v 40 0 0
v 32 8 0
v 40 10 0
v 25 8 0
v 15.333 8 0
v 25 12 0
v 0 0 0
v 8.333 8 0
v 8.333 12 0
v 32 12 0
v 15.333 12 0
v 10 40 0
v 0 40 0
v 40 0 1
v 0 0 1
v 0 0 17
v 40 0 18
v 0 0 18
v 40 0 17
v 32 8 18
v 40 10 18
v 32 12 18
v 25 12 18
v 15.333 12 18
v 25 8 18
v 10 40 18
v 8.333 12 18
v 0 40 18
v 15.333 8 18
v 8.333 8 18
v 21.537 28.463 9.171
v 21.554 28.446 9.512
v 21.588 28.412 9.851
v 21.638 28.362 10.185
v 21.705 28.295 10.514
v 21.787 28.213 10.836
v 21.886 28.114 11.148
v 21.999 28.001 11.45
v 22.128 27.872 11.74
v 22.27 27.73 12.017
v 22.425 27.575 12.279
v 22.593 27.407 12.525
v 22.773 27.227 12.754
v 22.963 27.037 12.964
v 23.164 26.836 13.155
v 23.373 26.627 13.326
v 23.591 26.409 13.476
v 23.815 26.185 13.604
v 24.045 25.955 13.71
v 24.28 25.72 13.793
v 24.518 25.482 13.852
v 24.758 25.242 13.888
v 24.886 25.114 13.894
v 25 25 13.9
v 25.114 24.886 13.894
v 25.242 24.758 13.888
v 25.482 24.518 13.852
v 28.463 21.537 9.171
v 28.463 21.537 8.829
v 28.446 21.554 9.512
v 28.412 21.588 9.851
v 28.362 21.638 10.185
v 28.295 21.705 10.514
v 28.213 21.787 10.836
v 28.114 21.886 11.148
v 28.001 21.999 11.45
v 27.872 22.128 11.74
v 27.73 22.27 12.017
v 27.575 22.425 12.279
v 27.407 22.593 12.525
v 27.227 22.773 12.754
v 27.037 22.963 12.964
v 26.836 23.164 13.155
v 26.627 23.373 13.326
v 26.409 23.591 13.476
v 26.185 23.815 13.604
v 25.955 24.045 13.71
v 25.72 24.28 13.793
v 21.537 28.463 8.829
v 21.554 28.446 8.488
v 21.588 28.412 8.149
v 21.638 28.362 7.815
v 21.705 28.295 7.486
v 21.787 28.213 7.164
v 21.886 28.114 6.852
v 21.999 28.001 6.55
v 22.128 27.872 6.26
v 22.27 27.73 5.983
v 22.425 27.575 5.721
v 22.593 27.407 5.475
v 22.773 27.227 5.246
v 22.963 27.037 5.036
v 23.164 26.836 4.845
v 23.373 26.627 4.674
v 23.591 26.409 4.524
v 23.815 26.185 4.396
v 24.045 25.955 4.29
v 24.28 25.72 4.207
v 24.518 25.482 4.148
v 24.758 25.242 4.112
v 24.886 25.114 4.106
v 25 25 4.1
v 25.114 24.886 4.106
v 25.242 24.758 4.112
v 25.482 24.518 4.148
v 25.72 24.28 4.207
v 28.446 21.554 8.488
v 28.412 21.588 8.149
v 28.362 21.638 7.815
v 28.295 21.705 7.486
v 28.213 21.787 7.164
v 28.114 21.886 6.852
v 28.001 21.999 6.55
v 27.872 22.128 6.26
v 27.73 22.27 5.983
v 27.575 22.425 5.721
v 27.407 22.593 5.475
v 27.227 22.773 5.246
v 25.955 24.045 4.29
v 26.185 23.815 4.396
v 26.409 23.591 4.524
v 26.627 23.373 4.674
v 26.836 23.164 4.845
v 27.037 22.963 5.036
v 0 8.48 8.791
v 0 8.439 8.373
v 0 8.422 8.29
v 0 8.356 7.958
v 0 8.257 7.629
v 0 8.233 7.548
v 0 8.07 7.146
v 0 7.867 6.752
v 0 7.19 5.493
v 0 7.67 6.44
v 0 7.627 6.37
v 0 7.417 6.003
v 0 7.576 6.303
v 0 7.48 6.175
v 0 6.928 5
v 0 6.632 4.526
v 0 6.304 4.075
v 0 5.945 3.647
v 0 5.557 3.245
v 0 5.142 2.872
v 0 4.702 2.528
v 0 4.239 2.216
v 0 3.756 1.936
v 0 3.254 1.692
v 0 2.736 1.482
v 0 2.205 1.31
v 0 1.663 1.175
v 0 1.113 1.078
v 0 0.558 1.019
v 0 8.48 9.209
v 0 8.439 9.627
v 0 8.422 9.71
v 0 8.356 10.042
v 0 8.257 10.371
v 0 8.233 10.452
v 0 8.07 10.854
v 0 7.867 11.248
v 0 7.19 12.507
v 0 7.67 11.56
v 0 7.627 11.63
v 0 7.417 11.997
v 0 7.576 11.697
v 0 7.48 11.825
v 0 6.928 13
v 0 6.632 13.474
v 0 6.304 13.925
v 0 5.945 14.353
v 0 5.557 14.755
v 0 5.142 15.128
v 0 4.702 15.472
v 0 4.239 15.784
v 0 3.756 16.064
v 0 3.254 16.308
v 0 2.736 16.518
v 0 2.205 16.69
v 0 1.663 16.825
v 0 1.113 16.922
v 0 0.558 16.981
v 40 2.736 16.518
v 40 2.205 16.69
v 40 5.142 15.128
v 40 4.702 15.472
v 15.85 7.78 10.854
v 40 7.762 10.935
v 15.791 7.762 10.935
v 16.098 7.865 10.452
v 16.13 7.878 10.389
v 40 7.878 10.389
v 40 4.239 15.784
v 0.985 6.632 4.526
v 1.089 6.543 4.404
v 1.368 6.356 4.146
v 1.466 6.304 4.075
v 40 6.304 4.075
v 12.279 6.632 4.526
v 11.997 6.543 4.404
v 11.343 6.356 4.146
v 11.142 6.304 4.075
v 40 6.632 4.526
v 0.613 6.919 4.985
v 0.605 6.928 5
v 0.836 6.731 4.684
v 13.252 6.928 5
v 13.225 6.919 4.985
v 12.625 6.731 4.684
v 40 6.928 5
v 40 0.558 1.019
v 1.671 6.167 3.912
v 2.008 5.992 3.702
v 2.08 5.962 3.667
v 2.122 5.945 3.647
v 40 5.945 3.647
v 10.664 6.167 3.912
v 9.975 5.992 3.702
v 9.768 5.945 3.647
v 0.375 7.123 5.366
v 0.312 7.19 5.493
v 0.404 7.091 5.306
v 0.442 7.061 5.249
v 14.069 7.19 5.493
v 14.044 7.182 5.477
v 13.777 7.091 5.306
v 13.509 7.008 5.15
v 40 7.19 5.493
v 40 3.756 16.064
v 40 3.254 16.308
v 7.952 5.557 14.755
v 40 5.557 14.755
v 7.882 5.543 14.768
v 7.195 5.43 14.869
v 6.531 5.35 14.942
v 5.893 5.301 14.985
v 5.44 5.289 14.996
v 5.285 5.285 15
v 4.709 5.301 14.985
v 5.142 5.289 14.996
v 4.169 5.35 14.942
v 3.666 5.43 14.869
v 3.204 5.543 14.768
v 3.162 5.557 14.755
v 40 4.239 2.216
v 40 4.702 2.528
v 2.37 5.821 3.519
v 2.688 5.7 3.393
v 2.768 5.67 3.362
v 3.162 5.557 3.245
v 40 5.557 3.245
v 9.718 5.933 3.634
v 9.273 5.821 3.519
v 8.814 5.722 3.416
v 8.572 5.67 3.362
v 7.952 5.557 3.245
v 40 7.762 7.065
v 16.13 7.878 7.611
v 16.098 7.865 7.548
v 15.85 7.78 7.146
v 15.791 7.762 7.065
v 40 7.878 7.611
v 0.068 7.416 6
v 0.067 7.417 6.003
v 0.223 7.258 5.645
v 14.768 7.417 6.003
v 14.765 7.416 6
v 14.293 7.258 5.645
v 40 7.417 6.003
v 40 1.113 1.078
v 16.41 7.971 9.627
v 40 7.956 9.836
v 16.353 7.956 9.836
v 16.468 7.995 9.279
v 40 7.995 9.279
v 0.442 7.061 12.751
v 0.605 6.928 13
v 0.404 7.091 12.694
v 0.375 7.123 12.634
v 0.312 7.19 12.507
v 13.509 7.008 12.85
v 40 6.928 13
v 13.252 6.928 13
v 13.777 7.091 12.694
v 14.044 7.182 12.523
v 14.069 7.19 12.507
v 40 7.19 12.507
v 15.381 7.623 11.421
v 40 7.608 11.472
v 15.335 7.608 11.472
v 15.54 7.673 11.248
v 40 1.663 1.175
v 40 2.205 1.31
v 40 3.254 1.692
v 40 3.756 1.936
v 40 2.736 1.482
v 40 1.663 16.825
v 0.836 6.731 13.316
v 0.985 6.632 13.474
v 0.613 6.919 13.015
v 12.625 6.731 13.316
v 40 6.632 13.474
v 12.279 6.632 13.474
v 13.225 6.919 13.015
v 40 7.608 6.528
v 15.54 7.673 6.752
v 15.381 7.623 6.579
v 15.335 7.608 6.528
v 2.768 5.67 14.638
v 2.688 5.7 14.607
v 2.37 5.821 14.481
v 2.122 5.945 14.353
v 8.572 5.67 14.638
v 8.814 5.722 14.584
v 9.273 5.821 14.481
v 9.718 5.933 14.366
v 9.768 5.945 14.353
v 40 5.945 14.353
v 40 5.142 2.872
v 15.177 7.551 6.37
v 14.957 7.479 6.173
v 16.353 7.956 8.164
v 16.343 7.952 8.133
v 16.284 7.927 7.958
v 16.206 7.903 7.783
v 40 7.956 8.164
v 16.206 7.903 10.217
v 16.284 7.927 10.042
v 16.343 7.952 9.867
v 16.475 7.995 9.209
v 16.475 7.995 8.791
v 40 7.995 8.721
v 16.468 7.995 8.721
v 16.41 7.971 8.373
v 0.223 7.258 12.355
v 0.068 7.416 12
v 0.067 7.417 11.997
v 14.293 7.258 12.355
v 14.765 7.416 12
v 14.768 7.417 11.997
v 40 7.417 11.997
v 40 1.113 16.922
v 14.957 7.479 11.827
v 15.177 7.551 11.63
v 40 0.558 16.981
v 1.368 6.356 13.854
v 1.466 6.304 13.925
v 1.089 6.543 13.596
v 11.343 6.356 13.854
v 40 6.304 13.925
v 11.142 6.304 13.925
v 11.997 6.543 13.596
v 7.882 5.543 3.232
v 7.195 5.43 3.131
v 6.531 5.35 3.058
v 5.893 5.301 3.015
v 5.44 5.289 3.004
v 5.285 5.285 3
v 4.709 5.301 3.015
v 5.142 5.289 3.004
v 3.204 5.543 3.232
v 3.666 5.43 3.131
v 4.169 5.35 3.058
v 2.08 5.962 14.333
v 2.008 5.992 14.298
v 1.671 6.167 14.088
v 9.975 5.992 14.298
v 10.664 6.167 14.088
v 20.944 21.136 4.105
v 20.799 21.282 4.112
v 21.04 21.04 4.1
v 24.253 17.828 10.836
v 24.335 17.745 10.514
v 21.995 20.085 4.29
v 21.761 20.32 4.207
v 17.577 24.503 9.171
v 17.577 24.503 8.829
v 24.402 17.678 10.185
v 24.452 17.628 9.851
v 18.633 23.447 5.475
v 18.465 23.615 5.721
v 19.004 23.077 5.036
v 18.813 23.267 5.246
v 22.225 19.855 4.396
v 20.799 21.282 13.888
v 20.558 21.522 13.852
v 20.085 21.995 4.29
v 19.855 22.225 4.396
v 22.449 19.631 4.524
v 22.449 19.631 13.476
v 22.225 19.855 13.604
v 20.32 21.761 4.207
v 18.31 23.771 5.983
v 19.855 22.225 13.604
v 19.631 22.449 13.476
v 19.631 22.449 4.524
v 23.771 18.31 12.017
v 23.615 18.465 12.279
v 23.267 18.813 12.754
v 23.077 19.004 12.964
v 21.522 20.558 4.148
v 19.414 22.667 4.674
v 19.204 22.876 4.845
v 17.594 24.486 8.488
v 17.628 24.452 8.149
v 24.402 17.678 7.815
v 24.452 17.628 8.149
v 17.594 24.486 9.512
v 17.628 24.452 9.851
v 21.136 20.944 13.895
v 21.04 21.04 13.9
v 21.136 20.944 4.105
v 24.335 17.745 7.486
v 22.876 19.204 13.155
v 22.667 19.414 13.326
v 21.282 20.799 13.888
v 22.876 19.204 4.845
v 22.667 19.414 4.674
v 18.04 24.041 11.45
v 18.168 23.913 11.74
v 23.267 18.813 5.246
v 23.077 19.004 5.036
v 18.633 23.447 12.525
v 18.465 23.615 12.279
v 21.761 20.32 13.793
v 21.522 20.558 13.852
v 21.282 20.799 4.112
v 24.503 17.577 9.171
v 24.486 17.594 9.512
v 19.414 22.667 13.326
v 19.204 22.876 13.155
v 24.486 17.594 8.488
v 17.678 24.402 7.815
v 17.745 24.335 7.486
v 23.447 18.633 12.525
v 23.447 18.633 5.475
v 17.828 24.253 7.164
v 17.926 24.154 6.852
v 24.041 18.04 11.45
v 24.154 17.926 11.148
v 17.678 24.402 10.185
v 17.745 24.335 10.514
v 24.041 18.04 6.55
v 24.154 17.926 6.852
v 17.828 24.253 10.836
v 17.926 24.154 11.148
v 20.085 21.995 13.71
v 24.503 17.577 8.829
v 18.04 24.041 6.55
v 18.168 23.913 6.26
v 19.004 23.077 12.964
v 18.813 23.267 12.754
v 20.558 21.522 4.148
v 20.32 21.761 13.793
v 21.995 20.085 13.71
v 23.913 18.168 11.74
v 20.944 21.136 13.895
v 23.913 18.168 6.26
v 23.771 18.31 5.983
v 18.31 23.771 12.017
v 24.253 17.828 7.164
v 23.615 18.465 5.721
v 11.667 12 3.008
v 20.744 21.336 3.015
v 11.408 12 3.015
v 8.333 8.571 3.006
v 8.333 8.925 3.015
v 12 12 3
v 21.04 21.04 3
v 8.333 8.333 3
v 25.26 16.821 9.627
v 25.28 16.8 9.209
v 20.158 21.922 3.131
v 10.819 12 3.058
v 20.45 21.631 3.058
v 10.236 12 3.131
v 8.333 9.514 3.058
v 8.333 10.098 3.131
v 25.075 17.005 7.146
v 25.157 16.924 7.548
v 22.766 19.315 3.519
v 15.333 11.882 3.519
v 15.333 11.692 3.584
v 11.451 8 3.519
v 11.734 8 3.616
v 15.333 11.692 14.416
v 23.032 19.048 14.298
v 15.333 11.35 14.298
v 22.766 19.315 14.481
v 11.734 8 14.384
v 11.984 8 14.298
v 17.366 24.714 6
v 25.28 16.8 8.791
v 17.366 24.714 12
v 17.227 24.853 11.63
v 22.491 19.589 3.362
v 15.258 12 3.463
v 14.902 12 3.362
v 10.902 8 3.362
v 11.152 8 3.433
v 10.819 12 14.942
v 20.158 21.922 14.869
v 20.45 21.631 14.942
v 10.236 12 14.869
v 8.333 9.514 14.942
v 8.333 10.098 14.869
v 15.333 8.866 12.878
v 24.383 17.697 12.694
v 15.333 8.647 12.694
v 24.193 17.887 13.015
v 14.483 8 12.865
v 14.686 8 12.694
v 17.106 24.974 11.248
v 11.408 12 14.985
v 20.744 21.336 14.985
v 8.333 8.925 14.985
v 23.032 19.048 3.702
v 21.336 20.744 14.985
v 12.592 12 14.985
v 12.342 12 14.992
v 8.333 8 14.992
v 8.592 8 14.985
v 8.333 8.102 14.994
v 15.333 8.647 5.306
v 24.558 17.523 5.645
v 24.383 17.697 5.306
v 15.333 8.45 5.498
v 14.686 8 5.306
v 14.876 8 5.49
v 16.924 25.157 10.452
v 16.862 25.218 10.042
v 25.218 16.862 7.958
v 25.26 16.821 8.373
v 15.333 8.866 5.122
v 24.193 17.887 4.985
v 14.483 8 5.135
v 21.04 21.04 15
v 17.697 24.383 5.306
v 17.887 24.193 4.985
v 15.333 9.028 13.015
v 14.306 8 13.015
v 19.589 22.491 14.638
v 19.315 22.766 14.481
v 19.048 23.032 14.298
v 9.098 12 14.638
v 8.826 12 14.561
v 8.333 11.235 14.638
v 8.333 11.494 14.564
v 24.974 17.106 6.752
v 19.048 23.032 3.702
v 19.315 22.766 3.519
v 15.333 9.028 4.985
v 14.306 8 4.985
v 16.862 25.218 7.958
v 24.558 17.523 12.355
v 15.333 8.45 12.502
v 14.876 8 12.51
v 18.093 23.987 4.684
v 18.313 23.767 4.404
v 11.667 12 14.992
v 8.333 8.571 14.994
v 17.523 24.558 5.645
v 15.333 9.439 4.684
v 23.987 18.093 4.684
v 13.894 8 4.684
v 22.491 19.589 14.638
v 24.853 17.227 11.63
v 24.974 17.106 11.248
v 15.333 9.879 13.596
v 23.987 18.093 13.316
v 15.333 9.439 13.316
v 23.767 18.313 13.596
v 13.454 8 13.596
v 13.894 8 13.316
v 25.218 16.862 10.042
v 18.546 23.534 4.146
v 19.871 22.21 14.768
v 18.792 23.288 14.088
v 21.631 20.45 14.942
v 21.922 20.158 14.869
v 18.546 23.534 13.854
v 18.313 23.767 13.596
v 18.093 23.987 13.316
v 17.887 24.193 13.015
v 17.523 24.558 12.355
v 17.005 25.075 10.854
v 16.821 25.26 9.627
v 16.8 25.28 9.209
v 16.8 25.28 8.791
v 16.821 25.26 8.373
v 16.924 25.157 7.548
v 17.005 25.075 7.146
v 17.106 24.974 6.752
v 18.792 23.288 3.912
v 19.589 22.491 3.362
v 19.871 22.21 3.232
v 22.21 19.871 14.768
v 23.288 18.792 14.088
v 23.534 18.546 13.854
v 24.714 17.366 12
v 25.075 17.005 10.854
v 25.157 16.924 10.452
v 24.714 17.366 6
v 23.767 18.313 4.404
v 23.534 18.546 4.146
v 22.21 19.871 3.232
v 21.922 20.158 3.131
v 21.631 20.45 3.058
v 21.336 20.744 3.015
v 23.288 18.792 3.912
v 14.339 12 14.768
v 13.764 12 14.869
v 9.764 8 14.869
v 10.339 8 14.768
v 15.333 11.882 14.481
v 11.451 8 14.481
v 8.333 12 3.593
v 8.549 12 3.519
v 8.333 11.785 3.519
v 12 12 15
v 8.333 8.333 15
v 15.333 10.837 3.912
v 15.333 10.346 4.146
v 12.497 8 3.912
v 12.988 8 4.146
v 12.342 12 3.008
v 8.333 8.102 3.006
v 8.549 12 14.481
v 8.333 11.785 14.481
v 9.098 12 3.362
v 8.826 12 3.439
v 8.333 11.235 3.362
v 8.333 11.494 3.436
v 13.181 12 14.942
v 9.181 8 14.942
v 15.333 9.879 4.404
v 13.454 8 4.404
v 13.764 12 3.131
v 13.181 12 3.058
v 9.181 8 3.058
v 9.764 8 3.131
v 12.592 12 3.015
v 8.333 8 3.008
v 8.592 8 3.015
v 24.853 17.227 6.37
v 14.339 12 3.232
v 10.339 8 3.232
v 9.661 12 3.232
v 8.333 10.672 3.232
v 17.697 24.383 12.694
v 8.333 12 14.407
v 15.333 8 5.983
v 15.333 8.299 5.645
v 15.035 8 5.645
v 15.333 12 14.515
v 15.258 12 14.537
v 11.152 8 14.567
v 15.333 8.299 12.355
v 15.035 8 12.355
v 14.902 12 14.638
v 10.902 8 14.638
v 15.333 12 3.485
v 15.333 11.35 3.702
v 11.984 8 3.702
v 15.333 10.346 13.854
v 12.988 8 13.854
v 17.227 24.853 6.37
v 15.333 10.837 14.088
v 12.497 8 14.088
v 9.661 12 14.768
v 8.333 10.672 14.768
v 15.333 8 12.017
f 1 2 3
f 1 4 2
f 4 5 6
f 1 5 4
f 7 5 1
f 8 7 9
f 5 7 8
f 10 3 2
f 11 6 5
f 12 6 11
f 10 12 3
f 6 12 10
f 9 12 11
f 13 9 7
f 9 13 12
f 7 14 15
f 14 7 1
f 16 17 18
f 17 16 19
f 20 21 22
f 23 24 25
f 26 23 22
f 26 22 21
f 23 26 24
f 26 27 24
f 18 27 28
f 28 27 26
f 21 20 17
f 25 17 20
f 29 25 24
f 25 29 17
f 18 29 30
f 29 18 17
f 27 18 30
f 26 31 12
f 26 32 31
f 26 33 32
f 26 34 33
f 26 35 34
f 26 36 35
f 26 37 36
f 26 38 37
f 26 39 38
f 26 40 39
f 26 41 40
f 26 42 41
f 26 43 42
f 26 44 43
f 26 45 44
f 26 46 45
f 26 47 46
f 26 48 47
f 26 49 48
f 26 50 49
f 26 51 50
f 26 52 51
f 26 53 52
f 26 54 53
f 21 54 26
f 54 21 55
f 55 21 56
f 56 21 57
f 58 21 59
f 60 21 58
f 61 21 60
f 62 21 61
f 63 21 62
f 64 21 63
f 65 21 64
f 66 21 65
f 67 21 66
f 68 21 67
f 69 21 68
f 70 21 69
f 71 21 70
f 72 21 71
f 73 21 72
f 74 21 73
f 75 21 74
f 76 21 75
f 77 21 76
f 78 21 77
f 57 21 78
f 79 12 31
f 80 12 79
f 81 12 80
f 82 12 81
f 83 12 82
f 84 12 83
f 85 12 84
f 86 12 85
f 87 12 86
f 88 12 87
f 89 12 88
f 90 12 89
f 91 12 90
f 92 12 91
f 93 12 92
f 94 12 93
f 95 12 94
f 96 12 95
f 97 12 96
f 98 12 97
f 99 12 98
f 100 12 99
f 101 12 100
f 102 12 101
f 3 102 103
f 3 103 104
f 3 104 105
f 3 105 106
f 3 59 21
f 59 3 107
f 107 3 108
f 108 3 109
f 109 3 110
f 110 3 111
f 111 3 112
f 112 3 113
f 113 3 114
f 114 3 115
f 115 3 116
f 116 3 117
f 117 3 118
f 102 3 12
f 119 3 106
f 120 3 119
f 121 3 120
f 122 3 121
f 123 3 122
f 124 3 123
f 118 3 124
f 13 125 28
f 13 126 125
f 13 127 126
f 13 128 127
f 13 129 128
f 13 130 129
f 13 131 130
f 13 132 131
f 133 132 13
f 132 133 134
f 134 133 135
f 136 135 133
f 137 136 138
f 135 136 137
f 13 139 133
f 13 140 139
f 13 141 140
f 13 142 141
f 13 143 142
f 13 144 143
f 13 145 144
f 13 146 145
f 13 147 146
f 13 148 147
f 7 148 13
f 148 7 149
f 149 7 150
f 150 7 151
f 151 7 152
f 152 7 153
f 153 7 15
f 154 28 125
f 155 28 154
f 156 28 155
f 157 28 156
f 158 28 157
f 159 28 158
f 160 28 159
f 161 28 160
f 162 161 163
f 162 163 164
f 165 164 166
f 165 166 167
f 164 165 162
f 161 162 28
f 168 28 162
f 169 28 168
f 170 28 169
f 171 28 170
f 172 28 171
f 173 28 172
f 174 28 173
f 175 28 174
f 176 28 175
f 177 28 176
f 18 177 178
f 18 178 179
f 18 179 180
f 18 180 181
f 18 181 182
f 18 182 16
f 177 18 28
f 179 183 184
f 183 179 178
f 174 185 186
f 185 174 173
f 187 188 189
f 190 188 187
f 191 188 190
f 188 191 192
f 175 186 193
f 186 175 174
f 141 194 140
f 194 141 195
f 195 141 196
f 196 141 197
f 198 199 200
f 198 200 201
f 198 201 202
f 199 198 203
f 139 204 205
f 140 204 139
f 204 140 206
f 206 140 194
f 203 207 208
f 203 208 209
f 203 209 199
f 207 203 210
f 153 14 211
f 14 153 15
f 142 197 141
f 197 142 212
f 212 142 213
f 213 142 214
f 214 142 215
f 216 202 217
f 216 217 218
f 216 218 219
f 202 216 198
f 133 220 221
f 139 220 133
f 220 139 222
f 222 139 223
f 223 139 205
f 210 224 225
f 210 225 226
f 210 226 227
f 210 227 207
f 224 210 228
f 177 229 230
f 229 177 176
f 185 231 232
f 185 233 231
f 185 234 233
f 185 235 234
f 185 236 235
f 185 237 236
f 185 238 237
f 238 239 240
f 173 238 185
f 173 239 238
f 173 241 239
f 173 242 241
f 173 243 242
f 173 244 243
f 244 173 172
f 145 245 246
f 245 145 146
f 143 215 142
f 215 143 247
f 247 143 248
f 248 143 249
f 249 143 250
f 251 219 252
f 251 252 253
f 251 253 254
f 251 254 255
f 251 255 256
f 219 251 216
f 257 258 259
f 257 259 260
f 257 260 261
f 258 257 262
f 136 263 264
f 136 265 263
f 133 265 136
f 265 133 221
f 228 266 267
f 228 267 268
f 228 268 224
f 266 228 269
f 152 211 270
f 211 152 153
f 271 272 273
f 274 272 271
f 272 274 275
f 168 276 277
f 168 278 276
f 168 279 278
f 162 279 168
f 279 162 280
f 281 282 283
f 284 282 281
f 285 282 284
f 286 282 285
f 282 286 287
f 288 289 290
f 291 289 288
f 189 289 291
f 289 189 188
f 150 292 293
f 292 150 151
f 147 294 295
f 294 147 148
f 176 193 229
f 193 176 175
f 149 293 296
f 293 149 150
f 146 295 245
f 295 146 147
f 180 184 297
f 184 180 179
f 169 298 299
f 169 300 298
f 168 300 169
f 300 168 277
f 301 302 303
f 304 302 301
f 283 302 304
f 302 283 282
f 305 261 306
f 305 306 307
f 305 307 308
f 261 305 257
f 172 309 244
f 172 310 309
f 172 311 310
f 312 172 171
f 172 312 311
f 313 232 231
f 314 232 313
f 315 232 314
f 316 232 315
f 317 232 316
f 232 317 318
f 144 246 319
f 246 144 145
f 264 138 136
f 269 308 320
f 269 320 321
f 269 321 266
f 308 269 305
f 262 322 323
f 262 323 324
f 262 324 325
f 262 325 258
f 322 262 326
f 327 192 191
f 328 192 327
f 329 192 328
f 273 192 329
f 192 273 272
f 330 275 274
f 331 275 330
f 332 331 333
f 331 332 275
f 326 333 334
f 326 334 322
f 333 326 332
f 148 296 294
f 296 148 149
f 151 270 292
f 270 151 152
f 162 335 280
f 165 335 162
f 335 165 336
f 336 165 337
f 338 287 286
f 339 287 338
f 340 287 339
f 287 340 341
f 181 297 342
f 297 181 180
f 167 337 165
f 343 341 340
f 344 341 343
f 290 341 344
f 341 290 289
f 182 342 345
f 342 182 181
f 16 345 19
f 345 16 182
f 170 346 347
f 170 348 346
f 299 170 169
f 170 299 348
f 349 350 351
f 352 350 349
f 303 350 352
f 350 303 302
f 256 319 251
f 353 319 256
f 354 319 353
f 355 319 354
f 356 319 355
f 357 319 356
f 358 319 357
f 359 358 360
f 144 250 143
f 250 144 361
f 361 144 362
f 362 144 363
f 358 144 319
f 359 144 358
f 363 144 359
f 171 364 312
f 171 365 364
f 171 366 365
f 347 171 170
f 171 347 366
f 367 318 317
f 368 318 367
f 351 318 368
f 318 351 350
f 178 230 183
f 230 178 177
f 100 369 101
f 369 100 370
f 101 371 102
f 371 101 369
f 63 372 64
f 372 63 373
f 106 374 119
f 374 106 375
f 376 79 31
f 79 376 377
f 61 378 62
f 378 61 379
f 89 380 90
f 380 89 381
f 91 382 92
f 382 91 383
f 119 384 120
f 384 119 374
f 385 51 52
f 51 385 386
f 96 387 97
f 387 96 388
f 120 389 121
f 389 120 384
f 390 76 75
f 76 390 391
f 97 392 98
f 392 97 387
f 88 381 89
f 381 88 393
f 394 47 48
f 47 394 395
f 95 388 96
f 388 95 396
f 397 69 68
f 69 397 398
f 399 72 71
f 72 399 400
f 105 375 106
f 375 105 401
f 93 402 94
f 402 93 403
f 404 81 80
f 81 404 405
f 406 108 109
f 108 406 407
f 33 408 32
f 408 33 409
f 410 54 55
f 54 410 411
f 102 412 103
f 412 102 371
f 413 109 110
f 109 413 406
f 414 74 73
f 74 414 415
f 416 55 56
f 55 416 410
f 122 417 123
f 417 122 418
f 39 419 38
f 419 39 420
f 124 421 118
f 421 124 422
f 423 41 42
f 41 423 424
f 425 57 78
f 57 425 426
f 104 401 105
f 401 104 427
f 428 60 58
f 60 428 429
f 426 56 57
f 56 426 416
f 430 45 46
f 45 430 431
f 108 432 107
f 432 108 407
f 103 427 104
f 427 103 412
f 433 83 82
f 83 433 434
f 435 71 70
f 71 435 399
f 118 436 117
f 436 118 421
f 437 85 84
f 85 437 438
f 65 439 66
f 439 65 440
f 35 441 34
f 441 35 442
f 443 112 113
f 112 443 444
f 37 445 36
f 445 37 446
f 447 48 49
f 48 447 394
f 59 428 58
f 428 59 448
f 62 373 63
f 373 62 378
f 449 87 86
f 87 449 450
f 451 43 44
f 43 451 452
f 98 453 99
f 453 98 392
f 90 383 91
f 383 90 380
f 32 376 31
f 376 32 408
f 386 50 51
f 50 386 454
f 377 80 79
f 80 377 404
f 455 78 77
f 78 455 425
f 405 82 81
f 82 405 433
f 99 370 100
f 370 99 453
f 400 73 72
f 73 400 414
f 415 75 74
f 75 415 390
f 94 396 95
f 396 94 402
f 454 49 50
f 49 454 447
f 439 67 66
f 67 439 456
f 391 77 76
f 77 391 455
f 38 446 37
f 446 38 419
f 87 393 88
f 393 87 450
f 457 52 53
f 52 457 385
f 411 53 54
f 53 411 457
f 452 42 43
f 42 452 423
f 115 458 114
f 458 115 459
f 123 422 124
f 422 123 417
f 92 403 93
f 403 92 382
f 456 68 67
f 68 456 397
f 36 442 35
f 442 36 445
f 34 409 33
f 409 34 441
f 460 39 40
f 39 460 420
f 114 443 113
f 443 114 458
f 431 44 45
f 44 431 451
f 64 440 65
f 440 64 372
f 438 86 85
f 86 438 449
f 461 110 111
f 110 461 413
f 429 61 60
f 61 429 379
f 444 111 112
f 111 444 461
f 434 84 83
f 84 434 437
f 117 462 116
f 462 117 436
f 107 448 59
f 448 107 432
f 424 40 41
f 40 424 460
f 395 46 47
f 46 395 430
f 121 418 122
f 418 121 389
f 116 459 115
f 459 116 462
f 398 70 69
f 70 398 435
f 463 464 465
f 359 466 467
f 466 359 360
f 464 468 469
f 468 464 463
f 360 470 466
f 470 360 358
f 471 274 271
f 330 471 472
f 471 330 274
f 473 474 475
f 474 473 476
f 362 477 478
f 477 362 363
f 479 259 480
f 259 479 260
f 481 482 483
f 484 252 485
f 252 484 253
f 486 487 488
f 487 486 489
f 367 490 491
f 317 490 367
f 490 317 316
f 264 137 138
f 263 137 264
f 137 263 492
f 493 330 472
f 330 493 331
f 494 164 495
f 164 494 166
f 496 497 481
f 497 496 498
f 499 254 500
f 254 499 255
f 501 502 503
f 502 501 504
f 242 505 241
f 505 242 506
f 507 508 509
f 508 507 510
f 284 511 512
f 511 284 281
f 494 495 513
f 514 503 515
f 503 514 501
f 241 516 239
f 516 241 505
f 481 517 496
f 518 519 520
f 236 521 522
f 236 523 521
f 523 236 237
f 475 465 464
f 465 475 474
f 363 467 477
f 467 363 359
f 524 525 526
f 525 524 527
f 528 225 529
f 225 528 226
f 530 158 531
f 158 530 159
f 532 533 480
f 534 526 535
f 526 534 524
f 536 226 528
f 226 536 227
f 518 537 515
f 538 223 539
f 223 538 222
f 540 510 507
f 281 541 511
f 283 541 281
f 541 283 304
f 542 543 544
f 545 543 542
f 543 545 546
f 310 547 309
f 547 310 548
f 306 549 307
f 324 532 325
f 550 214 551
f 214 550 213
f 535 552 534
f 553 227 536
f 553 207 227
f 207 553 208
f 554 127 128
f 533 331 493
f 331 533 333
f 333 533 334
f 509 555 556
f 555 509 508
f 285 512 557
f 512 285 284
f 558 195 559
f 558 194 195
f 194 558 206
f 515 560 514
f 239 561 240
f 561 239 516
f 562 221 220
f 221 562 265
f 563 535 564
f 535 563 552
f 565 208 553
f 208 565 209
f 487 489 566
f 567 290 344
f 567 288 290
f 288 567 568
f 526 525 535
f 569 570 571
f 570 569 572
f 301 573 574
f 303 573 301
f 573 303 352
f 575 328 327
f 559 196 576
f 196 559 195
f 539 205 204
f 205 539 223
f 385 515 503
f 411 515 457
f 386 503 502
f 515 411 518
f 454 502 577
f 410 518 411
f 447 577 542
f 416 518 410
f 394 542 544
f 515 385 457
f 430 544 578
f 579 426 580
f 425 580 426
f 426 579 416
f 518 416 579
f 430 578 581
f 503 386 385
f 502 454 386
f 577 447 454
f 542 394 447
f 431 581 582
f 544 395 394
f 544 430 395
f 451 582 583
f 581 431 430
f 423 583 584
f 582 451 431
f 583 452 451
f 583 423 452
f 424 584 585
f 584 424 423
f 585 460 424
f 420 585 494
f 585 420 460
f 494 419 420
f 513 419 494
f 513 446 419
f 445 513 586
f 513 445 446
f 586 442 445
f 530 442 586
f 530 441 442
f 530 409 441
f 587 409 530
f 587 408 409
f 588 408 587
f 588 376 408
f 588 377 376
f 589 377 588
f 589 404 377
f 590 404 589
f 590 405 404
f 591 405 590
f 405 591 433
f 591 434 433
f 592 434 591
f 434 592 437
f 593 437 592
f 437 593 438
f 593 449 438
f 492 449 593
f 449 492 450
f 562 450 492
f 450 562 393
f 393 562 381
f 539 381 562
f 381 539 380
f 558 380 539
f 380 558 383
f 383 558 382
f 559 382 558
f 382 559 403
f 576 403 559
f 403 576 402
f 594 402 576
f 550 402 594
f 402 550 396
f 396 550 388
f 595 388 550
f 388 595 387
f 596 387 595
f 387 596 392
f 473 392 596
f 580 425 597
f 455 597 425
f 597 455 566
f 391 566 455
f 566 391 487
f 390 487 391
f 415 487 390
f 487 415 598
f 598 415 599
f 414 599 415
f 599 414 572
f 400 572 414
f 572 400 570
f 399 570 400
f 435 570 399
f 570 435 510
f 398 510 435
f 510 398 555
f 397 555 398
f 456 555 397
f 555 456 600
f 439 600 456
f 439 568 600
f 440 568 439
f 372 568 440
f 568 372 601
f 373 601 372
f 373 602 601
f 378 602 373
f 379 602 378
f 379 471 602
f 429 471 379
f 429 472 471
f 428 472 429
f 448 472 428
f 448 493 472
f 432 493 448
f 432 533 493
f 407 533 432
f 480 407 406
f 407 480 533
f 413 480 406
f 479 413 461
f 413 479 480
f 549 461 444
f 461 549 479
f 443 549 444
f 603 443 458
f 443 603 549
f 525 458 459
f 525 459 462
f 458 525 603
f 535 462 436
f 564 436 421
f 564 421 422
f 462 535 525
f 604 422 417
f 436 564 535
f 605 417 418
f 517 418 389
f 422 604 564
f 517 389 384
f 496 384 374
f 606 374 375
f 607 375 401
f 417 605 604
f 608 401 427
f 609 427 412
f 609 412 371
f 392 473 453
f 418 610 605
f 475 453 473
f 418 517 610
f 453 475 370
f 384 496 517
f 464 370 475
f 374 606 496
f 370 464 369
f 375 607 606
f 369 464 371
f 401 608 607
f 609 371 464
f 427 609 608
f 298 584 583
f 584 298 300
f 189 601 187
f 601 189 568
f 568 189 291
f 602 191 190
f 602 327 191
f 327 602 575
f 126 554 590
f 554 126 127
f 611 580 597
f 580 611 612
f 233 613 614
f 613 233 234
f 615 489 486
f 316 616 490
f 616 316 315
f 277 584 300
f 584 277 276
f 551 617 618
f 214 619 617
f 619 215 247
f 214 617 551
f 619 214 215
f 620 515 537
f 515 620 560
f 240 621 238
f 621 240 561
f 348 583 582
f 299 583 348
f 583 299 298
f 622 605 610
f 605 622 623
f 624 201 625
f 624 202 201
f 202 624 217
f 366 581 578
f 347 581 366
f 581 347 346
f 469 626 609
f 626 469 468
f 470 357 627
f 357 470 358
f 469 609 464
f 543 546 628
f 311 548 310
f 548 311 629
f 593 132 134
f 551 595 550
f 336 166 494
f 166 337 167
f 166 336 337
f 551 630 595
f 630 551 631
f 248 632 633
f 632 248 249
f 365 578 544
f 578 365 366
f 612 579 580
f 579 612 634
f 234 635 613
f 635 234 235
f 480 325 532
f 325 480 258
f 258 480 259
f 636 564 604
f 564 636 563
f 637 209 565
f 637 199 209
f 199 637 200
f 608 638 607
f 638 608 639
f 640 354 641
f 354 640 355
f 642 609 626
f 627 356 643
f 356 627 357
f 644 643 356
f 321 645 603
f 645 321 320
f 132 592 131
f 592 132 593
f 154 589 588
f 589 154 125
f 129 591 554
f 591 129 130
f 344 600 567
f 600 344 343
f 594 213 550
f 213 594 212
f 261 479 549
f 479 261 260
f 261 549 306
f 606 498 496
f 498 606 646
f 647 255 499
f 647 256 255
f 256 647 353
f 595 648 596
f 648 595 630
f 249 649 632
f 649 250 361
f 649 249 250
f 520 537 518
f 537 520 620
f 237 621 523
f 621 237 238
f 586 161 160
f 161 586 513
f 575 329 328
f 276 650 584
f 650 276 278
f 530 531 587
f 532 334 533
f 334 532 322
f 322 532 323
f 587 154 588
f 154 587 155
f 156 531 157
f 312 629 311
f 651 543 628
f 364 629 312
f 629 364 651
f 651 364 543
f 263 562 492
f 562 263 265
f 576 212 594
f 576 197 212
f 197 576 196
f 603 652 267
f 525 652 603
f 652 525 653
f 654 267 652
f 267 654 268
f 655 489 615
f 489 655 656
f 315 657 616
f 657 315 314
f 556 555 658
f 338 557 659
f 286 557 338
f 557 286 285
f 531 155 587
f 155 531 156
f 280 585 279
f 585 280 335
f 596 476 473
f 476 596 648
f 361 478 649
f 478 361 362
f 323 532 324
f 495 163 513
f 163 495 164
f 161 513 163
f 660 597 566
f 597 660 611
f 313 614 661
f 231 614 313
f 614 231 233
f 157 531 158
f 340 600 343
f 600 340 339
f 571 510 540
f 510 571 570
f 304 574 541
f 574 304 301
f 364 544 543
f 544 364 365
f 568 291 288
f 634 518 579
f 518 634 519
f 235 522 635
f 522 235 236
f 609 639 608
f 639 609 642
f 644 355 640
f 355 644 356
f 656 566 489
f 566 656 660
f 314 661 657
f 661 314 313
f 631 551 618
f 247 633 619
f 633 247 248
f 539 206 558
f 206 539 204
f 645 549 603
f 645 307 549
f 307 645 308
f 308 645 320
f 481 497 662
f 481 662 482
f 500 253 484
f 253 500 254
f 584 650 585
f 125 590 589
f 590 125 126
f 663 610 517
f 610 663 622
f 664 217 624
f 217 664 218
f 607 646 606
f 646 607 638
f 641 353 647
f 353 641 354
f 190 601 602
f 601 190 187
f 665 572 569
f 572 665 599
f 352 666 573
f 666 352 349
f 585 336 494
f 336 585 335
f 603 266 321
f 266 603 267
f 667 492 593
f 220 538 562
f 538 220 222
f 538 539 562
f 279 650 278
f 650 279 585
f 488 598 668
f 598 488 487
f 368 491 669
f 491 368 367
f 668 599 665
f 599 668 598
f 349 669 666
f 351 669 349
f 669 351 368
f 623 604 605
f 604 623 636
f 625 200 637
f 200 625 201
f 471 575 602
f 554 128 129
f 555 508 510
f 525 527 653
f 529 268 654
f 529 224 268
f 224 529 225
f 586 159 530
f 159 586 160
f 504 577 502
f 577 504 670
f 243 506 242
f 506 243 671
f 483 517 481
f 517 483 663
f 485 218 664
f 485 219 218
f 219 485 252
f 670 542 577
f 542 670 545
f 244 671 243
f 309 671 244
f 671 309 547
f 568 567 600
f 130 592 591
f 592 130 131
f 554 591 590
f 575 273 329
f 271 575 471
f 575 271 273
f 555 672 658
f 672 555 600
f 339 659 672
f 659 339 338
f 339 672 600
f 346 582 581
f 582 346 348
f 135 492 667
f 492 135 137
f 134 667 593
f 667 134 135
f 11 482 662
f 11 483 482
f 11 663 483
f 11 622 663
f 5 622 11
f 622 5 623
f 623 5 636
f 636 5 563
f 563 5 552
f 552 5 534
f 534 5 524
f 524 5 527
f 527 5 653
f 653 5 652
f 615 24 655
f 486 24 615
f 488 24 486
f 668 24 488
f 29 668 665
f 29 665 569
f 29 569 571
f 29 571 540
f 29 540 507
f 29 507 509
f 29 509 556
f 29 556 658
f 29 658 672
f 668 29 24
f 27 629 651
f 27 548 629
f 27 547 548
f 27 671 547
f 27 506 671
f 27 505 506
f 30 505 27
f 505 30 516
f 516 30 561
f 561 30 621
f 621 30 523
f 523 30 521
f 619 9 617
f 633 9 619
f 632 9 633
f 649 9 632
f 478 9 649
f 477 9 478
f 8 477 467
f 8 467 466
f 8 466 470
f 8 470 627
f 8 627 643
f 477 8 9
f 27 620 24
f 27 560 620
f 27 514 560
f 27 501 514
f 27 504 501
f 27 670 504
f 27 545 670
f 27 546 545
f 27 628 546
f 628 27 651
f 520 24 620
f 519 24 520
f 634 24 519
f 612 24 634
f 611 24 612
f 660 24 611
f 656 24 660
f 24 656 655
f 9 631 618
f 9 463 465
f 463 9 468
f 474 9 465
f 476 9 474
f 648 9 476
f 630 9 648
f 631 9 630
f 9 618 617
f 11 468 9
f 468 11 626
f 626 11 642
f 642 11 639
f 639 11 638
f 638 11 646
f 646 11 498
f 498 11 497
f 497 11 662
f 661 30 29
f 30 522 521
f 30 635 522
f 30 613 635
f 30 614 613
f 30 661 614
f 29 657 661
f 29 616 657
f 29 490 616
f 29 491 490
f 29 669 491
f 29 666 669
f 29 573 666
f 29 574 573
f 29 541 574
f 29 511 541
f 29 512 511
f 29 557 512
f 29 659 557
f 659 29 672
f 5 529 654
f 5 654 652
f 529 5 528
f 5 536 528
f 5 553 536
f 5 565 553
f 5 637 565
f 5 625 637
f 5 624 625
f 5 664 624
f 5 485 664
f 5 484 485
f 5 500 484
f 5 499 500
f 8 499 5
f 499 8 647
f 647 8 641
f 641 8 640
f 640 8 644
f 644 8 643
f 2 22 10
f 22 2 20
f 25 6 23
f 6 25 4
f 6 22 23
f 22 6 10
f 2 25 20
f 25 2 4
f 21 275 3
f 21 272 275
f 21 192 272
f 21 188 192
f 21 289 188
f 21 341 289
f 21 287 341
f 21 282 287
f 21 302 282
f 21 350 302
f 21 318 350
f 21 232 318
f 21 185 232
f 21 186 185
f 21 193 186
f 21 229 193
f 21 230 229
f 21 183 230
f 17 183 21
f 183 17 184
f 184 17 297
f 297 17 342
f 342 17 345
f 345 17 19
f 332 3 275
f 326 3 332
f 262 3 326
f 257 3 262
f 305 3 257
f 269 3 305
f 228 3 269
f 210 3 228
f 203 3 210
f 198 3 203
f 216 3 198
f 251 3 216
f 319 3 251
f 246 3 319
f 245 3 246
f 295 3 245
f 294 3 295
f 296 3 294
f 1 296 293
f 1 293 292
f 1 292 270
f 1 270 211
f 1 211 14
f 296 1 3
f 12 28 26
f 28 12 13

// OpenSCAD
poleSize=16;
blockHeavyness=2;
blockHeight=50;
blockDepth=50;
screwAccessHole=12;
screwSize=6;
coupleDepth=5.6;
coupleDiameter=9.8;
binderWidth=7;
binderHeight=4;
tollerance=0;

//shorten
t = tollerance;

//settings
$fn=90;
//Math
//witdh of the block
blockWidth=poleSize+blockHeavyness;
//length of line betewen right angle and middle of triangleside C
triHeightC=blockHeight*blockDepth/sqrt(blockHeight*blockHeight+blockDepth*blockDepth);



difference(){
    //MainBlock
    rotate([0,0,0]){
        linear_extrude(height = blockWidth){
            polygon(points=[[0,0],[0,blockDepth],[blockHeight,0]]);
        }
    }
        //pole
    translate([-1,0,blockWidth/2]){
        rotate([0,90,0]){
            cylinder(d=poleSize+t,h=blockHeight+2);
        }
    }
    //screwHole
    translate([0,0,blockWidth/2]){
        rotate([0,90,45]){
            cylinder(d=coupleDiameter+t,h=75);
        }
    }
    //srewAccessHole
    translate([0,0,blockWidth/2]){
        rotate([0,90,45]){
            cylinder(d=screwAccessHole+t,h=triHeightC-coupleDepth);
        }
    }
    //strpiBlock1
    translate([blockHeight/6,poleSize/2,-1]){
        cube([binderWidth,binderHeight,blockWidth+2]);
    }
    //strpiBlock2
    translate([blockHeight/6*3,poleSize/2,-1]){
        cube([binderWidth,binderHeight,blockWidth+2]);
    }
    //endFlatBlockTop
    translate([blockHeight-10,-1,-0.5]){
        cube([11,11,blockWidth+2]);
    }
    //endFlatBlockBottom
    translate([-0.5,blockDepth-10,-1]){
        cube([11,11,blockWidth+2]);
    }
}
